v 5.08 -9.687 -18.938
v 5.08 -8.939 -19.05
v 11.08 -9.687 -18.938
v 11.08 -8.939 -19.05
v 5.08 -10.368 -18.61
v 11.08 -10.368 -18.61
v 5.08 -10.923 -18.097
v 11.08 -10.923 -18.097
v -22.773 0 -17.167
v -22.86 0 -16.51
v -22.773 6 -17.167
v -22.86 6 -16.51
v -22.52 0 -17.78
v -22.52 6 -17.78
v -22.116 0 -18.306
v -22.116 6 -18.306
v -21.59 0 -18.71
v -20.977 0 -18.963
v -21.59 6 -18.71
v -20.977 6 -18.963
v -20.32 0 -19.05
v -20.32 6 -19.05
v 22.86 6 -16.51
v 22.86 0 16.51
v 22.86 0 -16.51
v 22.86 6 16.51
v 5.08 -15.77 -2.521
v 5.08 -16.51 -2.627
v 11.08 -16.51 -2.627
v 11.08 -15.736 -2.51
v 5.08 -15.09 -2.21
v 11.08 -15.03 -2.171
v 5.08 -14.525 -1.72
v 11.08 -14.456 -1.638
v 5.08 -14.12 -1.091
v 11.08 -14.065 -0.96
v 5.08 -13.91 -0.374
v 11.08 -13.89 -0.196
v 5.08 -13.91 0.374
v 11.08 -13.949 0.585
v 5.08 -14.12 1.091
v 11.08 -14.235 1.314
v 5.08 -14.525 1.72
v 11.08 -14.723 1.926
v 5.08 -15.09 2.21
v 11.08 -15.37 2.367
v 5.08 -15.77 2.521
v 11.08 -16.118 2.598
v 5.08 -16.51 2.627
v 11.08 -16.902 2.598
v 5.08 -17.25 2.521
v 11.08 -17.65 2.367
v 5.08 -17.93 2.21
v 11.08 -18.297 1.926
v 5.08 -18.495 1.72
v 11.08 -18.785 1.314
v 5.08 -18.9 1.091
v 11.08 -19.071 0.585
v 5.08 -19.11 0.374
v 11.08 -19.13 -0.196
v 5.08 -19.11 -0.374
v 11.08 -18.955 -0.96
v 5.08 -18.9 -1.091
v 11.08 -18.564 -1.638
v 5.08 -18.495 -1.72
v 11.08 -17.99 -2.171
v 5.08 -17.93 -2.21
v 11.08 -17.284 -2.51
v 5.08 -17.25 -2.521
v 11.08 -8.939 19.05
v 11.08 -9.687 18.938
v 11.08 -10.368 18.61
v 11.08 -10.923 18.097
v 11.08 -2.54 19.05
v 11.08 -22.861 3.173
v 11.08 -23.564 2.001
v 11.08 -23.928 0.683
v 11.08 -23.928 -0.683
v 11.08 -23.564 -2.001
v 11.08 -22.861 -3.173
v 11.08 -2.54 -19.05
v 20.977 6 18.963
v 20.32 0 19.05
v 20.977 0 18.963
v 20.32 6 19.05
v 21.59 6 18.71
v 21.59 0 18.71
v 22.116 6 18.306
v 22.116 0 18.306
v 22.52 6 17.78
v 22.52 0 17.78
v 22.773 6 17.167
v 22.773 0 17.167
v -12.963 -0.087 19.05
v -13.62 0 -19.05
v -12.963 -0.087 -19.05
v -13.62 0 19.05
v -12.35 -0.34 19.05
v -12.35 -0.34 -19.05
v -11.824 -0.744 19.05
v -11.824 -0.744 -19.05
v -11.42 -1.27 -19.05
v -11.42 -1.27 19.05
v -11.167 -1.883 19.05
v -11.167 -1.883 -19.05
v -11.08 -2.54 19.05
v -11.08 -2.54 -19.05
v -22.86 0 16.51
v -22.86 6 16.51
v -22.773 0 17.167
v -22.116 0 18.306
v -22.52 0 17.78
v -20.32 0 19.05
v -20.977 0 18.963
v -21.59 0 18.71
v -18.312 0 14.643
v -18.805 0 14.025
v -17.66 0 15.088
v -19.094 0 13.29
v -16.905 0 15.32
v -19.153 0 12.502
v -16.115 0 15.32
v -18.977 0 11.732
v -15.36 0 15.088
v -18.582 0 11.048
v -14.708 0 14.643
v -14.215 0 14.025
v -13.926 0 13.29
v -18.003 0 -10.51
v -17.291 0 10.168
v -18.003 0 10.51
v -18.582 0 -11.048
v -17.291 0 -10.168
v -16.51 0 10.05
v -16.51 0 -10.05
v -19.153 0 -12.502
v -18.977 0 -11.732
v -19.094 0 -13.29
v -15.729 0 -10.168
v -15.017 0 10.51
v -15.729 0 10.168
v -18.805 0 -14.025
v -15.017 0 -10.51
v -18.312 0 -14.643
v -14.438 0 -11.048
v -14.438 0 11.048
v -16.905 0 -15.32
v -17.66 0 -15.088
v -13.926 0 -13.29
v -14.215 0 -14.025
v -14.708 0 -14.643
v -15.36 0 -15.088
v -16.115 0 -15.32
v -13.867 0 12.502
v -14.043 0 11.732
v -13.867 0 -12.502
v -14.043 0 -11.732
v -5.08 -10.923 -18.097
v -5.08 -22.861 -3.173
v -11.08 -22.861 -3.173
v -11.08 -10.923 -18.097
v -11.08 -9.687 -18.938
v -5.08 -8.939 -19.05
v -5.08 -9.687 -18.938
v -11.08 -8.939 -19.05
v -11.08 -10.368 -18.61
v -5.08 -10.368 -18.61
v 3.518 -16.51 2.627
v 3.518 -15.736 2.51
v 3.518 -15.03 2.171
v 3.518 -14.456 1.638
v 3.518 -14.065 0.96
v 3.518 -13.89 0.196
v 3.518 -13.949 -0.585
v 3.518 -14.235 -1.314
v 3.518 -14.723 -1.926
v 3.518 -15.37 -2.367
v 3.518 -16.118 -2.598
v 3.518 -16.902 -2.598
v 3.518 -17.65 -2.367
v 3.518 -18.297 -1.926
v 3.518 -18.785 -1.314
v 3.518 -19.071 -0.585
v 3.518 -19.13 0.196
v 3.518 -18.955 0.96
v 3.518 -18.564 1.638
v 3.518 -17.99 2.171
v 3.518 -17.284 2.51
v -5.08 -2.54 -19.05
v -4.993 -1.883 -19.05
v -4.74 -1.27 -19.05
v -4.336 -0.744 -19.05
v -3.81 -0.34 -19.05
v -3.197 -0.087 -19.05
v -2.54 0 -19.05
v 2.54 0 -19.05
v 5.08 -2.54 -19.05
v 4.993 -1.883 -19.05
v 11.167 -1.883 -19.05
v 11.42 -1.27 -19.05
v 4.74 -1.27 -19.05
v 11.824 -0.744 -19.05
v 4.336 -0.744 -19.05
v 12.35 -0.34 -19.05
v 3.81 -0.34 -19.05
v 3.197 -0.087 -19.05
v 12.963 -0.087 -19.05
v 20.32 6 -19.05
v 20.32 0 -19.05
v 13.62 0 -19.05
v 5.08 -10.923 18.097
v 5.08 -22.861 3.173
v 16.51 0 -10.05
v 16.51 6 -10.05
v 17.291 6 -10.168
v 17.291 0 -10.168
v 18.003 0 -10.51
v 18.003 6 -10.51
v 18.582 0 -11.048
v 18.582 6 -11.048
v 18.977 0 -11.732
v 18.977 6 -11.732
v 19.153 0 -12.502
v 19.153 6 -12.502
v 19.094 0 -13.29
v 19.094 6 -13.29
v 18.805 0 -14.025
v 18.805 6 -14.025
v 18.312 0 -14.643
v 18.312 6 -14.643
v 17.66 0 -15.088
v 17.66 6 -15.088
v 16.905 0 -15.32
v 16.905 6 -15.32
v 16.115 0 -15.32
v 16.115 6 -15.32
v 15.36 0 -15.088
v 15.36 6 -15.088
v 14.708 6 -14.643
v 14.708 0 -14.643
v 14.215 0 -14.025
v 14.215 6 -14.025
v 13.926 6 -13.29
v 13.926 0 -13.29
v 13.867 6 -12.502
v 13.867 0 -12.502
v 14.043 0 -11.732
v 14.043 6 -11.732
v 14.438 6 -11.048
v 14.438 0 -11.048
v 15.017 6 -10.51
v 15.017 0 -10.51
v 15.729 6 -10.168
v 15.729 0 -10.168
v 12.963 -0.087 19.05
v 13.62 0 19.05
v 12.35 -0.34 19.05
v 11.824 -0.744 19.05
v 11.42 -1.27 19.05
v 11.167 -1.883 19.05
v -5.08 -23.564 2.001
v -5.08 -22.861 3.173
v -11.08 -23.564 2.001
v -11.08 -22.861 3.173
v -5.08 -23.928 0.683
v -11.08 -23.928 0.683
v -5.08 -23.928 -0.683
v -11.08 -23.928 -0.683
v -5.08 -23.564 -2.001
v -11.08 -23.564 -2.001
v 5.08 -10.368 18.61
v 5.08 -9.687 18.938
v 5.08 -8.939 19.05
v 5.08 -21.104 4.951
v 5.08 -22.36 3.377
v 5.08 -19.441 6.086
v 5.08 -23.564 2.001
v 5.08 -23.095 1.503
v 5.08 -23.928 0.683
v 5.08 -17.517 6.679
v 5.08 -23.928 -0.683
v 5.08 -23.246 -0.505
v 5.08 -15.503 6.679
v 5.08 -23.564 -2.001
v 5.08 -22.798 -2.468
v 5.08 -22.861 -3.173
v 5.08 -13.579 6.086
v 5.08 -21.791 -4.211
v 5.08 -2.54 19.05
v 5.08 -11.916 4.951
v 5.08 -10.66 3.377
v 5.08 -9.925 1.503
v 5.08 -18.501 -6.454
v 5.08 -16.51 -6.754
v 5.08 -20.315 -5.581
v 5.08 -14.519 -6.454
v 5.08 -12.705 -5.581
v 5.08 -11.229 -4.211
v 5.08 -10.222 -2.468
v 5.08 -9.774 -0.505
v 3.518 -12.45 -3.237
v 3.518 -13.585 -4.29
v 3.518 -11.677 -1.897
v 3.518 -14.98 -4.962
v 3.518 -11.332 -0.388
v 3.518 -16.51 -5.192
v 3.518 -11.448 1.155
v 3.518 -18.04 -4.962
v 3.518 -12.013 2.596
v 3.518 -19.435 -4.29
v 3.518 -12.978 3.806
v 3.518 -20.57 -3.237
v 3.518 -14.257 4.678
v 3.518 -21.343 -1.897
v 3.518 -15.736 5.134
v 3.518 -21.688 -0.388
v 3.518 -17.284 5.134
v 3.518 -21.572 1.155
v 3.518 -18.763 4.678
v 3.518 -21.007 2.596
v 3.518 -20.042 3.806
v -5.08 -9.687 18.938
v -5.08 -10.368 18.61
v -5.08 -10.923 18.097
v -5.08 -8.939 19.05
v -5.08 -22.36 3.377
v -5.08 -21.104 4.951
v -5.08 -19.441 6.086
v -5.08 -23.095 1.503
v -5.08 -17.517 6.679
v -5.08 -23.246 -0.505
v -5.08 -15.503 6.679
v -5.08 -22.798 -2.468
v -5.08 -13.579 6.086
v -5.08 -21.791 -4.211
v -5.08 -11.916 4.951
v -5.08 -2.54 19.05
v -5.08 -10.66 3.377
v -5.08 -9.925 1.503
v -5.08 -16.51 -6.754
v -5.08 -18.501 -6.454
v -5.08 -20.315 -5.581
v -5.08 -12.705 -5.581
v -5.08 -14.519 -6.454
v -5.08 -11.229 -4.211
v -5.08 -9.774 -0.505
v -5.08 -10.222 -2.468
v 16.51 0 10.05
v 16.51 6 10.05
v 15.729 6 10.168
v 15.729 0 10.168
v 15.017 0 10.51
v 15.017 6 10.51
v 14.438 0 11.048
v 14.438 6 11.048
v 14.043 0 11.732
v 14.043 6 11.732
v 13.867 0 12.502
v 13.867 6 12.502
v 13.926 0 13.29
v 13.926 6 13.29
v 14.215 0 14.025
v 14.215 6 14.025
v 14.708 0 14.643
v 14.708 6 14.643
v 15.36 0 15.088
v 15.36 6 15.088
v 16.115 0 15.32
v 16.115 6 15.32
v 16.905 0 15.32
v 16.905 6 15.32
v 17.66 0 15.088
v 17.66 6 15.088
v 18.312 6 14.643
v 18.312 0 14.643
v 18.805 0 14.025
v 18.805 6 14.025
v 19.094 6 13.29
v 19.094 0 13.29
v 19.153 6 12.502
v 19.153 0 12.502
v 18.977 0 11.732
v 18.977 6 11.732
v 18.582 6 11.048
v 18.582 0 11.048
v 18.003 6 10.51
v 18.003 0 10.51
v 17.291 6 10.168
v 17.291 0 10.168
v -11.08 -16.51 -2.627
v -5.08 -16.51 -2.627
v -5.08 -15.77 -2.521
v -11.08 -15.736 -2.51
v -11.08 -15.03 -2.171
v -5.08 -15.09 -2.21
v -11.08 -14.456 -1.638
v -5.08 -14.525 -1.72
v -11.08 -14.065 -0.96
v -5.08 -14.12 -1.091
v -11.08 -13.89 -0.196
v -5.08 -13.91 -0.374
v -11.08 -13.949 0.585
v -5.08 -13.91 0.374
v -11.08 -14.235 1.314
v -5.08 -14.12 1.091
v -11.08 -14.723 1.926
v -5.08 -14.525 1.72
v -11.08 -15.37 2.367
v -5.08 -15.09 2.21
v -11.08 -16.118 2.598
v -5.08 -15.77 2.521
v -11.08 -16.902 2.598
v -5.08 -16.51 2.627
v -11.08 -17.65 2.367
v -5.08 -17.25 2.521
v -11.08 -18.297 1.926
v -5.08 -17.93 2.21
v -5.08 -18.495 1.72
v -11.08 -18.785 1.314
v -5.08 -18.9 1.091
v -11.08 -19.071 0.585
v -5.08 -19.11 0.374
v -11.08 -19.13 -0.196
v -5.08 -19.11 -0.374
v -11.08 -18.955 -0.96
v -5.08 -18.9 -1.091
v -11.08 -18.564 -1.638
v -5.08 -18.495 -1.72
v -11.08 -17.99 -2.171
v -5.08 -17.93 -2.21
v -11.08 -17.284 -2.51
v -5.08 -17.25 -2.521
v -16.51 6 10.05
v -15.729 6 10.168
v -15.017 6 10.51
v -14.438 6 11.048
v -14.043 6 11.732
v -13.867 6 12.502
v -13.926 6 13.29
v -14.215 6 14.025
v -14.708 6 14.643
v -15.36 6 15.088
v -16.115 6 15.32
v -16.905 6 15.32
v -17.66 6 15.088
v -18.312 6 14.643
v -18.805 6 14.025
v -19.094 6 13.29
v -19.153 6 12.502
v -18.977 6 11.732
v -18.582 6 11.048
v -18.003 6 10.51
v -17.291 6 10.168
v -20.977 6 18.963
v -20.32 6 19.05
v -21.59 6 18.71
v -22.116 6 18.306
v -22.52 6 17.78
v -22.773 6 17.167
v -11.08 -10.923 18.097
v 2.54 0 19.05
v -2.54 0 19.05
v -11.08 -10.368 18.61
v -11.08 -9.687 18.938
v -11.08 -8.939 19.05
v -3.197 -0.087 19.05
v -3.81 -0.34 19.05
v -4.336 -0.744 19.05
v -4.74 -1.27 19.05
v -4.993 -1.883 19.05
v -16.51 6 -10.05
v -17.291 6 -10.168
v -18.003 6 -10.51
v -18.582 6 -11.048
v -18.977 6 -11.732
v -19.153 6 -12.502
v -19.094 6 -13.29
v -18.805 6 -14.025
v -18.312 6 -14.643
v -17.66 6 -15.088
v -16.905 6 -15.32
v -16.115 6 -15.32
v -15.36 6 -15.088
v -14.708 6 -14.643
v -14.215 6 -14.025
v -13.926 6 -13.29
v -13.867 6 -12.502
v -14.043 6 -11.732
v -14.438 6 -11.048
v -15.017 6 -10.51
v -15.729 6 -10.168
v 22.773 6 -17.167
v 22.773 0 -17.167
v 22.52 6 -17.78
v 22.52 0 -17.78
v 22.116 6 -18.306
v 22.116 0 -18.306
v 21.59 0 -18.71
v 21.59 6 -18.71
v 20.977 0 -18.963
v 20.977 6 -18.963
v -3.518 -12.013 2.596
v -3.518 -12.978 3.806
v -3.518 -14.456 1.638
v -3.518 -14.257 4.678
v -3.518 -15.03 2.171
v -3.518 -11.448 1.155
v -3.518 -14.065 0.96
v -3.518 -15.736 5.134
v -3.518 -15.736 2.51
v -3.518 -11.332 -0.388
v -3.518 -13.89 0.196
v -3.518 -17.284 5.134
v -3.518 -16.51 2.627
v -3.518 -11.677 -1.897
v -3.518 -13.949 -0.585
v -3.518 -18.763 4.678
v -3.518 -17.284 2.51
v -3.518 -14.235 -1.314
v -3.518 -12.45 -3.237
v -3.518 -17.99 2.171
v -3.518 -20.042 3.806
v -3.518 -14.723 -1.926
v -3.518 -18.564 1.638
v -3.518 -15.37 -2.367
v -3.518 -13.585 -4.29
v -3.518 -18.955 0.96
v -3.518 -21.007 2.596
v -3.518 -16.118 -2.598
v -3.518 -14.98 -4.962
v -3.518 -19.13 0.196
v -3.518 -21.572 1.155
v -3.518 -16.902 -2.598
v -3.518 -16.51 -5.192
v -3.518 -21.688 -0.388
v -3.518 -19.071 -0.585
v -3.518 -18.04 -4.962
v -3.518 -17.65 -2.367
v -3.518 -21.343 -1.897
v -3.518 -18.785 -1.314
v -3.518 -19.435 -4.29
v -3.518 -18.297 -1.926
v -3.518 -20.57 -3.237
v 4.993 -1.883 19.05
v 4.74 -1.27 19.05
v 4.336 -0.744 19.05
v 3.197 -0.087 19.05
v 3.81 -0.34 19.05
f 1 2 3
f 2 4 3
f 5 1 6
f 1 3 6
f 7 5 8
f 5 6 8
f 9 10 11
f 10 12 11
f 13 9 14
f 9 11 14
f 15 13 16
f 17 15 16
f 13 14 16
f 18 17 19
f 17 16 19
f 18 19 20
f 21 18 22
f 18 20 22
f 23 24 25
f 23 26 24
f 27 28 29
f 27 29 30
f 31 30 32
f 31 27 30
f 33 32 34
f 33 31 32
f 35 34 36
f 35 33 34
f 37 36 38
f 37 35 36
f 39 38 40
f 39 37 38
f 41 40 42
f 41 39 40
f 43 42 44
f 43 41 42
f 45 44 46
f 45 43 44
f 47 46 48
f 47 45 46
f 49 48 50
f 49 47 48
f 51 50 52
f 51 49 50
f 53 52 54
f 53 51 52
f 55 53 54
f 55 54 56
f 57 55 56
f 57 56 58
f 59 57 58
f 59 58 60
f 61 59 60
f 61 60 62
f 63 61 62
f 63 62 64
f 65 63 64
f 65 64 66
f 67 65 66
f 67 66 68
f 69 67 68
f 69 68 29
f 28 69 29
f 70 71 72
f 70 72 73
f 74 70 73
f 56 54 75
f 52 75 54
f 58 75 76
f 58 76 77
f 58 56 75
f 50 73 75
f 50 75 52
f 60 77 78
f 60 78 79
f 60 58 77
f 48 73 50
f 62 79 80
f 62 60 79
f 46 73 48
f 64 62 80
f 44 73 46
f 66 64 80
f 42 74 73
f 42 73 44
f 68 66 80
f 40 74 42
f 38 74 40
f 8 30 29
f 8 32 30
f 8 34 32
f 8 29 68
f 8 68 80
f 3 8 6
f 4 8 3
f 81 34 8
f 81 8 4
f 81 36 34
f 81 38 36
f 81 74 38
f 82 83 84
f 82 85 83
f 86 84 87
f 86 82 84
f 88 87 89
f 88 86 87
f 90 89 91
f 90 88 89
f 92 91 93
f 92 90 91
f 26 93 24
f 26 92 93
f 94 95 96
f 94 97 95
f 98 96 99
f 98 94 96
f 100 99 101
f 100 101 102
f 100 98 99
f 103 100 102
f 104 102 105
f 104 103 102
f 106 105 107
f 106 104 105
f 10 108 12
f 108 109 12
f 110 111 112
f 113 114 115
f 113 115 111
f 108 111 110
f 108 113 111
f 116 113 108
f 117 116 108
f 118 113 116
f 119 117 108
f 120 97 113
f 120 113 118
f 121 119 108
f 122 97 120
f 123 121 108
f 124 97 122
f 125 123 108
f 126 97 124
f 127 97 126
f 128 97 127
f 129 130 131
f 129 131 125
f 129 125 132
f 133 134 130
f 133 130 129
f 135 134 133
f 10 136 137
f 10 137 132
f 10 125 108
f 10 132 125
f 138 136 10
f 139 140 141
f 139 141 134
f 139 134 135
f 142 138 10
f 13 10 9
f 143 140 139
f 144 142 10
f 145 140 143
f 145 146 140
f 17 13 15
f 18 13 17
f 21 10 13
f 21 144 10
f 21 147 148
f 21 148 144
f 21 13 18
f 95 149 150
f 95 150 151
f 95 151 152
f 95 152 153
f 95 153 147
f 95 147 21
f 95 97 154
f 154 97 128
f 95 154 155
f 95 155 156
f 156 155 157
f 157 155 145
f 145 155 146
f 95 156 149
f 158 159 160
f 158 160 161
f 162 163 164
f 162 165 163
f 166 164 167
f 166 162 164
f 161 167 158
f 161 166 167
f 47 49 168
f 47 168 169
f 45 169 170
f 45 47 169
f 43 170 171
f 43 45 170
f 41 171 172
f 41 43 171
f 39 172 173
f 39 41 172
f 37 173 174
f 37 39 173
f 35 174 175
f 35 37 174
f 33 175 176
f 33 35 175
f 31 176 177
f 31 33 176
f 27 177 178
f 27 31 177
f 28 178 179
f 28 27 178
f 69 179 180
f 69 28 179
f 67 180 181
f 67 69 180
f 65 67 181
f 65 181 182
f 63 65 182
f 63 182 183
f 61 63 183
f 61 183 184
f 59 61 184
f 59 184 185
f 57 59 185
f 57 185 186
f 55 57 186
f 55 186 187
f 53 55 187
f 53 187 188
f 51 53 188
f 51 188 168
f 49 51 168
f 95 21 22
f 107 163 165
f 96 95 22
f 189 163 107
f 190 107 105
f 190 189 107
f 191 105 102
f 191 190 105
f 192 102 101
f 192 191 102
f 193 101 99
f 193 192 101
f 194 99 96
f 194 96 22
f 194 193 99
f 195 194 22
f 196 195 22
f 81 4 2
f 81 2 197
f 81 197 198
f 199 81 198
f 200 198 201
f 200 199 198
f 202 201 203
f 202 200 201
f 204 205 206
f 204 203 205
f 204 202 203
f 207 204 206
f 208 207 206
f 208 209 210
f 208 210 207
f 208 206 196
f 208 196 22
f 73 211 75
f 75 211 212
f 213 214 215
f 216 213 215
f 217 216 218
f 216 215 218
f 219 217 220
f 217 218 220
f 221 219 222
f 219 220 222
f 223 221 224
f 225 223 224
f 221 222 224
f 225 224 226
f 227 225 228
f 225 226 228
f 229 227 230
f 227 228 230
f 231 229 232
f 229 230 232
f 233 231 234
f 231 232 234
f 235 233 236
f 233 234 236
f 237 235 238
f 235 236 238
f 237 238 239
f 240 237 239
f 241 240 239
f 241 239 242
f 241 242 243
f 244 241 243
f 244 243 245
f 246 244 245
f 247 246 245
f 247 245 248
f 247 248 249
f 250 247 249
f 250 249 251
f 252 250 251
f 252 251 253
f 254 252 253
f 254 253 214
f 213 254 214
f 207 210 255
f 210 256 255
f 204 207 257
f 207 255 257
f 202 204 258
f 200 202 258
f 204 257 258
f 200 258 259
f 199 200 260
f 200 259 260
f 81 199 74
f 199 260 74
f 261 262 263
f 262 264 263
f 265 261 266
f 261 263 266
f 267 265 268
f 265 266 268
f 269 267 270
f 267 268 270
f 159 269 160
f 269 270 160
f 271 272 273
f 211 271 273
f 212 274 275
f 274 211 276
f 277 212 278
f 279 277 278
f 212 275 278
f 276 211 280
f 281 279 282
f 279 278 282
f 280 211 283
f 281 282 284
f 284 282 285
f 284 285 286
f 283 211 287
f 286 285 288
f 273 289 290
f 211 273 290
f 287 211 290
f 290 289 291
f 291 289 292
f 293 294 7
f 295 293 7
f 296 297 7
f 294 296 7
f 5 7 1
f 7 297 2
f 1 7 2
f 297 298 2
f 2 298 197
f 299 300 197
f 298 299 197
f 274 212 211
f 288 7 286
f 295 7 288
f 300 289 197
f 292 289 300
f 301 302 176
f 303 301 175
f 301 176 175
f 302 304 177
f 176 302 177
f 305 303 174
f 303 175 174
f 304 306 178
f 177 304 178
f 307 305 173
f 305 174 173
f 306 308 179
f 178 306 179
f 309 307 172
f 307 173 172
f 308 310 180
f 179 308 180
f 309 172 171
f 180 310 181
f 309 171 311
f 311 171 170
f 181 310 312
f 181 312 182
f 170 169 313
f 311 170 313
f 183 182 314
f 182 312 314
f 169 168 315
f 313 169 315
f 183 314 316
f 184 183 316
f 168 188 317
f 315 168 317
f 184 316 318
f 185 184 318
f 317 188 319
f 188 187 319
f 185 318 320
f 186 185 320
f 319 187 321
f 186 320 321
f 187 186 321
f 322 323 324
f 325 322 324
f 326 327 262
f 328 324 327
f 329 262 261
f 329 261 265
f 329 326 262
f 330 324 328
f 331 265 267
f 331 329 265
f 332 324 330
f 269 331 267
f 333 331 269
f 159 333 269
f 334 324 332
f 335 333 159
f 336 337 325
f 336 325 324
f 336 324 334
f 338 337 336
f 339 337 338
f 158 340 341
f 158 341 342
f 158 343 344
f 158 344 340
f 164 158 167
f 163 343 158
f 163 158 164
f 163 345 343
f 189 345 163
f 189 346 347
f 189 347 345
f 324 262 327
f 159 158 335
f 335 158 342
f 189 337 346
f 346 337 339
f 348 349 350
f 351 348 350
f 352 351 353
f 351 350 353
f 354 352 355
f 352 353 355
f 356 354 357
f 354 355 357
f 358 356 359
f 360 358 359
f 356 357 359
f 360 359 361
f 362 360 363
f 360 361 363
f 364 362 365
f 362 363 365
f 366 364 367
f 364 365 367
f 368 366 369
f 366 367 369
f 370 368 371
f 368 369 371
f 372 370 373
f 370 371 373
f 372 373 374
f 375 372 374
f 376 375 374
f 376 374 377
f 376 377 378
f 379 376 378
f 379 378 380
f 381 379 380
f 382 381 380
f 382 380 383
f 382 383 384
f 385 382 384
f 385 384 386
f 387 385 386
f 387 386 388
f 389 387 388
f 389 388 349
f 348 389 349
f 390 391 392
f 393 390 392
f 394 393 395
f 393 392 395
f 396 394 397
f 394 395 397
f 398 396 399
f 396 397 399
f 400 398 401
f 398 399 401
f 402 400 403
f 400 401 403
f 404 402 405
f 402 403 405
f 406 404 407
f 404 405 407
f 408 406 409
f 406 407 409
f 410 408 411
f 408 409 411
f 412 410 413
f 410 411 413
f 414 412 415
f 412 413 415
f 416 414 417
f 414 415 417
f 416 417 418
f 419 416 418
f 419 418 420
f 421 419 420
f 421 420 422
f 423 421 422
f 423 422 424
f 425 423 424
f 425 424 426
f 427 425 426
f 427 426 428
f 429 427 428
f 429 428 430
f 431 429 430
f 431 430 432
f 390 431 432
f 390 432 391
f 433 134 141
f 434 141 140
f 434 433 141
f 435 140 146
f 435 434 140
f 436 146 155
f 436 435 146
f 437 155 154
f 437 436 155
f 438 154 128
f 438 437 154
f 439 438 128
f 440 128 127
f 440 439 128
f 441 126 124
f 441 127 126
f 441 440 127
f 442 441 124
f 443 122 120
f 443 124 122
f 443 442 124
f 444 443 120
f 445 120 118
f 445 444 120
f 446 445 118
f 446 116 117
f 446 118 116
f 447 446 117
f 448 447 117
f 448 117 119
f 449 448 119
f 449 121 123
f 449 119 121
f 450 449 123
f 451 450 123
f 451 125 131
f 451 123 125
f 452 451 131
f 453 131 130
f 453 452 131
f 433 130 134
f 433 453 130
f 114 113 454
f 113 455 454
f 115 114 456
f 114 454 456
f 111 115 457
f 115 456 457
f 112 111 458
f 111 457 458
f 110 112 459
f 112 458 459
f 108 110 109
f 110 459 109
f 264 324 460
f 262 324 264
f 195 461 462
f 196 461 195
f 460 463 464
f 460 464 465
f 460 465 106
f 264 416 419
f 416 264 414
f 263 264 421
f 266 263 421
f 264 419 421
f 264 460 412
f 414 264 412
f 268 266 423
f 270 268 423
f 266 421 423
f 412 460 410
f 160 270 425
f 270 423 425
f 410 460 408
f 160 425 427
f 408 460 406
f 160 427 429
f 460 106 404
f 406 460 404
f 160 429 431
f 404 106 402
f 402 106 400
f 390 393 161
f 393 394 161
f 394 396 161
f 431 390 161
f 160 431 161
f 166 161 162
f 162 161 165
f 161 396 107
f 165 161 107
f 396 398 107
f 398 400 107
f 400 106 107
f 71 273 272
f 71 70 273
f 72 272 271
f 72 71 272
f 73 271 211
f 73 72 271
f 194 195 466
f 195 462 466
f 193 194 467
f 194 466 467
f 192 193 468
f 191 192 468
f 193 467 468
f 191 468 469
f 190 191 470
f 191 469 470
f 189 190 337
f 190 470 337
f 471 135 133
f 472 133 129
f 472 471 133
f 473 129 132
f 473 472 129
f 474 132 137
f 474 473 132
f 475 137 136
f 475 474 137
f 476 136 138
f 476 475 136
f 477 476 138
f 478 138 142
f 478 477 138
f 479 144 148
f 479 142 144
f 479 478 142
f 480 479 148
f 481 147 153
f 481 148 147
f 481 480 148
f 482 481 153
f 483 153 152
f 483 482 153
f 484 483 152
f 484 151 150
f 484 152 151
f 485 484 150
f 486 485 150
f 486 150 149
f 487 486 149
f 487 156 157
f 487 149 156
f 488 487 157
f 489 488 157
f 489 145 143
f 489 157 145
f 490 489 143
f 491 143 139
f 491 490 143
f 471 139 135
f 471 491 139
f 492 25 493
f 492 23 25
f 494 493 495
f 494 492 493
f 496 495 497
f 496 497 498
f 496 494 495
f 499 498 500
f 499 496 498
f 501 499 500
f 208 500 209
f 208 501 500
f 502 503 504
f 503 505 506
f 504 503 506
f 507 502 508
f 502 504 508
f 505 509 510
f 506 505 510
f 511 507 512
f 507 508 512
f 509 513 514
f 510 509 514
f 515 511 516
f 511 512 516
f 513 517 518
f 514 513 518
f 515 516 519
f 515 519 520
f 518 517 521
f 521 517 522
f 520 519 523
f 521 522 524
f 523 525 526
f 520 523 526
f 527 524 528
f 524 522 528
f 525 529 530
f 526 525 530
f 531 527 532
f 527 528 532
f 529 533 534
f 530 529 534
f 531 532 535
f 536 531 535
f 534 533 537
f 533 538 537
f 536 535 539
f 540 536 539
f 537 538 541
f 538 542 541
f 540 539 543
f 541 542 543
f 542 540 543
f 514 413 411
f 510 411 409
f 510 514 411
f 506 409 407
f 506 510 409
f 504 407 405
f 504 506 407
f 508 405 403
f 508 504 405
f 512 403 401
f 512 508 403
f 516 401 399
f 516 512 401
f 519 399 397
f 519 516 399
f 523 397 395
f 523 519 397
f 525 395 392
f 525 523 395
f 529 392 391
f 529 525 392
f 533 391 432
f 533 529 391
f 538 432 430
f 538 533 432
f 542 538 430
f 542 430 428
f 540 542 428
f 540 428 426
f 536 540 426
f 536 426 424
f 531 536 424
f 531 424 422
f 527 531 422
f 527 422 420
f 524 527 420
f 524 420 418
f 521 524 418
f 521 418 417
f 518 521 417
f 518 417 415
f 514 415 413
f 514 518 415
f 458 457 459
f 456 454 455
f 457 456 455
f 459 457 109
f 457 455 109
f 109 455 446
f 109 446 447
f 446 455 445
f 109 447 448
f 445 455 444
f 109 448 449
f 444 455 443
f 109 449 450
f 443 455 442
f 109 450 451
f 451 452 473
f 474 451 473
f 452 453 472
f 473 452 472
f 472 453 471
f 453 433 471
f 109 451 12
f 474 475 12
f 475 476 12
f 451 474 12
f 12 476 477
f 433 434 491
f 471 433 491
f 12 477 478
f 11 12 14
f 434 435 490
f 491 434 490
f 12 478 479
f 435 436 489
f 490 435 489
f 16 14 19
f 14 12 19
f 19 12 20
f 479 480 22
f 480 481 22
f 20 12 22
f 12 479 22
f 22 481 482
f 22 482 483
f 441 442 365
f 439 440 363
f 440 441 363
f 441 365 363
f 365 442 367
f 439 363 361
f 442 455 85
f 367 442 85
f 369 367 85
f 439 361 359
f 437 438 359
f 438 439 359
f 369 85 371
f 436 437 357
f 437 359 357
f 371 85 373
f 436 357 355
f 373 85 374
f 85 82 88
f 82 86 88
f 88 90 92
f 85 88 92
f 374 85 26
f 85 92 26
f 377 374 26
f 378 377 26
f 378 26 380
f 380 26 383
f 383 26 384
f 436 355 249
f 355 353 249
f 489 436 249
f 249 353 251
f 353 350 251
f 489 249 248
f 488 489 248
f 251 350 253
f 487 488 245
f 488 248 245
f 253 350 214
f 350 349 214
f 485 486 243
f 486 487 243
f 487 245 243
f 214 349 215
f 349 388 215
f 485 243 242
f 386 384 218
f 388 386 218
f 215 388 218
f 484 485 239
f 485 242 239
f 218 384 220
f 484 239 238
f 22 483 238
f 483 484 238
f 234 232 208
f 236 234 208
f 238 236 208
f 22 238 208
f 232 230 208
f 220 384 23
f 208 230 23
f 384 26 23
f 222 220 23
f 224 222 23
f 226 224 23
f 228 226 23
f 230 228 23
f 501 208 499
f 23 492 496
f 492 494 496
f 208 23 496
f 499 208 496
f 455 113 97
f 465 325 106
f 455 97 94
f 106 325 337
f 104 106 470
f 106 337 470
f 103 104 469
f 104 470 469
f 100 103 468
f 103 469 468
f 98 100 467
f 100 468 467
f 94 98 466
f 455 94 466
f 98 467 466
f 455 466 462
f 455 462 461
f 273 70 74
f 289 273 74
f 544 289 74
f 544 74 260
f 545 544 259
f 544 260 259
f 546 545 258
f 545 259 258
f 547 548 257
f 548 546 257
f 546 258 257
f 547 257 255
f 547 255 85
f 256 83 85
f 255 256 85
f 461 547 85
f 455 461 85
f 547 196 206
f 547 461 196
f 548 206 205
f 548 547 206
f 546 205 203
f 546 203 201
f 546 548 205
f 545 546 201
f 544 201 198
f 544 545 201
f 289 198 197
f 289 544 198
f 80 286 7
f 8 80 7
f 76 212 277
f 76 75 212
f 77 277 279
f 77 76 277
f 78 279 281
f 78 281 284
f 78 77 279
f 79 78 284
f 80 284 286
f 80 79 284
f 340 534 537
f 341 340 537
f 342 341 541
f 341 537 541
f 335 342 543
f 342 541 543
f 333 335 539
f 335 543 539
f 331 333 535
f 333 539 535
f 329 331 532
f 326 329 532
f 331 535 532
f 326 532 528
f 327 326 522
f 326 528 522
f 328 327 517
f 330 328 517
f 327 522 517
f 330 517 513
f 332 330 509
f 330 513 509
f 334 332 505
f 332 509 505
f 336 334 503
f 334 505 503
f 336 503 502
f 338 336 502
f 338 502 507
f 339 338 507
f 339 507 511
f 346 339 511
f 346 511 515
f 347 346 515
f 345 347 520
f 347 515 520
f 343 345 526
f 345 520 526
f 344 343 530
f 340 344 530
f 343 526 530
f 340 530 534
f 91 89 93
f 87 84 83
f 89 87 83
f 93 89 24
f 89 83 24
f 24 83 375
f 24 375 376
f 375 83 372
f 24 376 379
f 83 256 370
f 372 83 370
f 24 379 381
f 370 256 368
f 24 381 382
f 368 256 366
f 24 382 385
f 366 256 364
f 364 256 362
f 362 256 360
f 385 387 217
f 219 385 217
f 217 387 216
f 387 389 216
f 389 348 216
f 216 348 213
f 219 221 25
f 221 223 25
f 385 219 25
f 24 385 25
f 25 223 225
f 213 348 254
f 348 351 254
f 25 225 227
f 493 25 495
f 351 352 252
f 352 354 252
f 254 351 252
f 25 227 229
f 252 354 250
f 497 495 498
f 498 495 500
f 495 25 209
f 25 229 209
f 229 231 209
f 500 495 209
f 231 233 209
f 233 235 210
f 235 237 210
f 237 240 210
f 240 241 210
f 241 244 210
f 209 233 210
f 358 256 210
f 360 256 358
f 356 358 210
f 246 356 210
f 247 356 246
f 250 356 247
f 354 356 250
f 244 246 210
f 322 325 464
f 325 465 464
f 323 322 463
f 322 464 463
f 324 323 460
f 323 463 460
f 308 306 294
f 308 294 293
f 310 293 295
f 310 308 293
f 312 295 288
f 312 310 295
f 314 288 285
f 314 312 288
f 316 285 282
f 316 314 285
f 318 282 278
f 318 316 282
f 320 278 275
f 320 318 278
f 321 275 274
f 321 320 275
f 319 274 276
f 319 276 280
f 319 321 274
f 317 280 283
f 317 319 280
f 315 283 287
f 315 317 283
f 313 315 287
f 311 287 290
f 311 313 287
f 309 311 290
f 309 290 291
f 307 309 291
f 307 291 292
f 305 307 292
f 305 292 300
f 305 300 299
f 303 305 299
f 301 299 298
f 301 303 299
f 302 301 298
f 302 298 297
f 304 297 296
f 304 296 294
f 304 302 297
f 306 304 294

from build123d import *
from OCP.BRepFilletAPI import BRepFilletAPI_MakeFillet

# Parameters (mm, degrees)
SKETCH1_R           = 2.627
BOSS_EXTRUDE1_DEPTH = 6
BOSS_EXTRUDE2_START = -5.08
SKETCH1_3_W         = 38.1
SKETCH1_3_H         = 5.999999938
BOSS_EXTRUDE2_DEPTH = 22.86
SKETCH3_R           = 2.65
CUT_EXTRUDE1_DEPTH  = 44.260167546
FILLET1_R1          = 2.54
FILLET1_R2          = 5.08
SKETCH4_R           = 4.2145
SKETCH4_R_2         = 2.627
BOSS_EXTRUDE3_DEPTH = 1.5621
BOSS_EXTRUDE4_START = 8.5979
SKETCH4_2_R         = 4.2145
SKETCH4_2_R_2       = 2.627
BOSS_EXTRUDE4_DEPTH = 1.5621
CHAMFER2_SIZE       = 2.54


with BuildPart() as part:
    # Sketch1 → Boss-Extrude1 (new body)
    with BuildSketch(Plane(origin=(5.08, 0, 0), x_dir=(0, 0, -1), z_dir=(1, 0, 0))):
        Polygon((-19.05, 0), (-19.05, -10.16), (0, -25.4), (19.05, -10.16), (19.05, 0), align=None)
        with Locations((0, -16.51)):
            Circle(SKETCH1_R, mode=Mode.SUBTRACT)
    boss_extrude1 = extrude(amount=BOSS_EXTRUDE1_DEPTH)

    # Sketch1<3> → Boss-Extrude2 (add)
    with BuildSketch(Plane(origin=(5.08, 0, 0), x_dir=(0, 0, -1), z_dir=(1, 0, 0)).offset(BOSS_EXTRUDE2_START)):
        with Locations((0, 2.999999969)):
            Rectangle(SKETCH1_3_W, SKETCH1_3_H)
    boss_extrude2 = extrude(amount=BOSS_EXTRUDE2_DEPTH)

    # Sketch3 → Cut-Extrude1 (cut, through all)
    with BuildSketch(Plane(origin=(0, 5.999999938, 0), x_dir=(1, 0, 0), z_dir=(0, 1, 0))):
        with Locations(Location((16.51, 12.7, 0), (0, 0, 270))):
            Circle(SKETCH3_R)
        with Locations(Location((16.51, -12.7, 0), (0, 0, 90))):
            Circle(SKETCH3_R)
    cut_extrude1 = extrude(amount=-CUT_EXTRUDE1_DEPTH, mode=Mode.SUBTRACT)

    # Mirror2: Boss-Extrude2, Cut-Extrude1 across plane
    add(boss_extrude2.mirror(Plane(origin=(0, 0, 0), x_dir=(0, 0, 1), z_dir=(1, 0, 0))))
    add(cut_extrude1.mirror(Plane(origin=(0, 0, 0), x_dir=(0, 0, 1), z_dir=(1, 0, 0))), mode=Mode.SUBTRACT)

    # Mirror3: Boss-Extrude1 across plane
    add(boss_extrude1.mirror(Plane(origin=(0, 0, 0), x_dir=(0, 0, 1), z_dir=(1, 0, 0))))

    # Fillet1: one fillet with a radius per group of edges: ONE call of the kernel's fillet builder (fillet() takes one radius for all edges)
    fillet1_edges_1 = [part.edges().sort_by_distance(p)[0] for p in [
        (8.08, -10.16, 19.05),
        (8.08, -10.16, -19.05),
        (11.08, 0, 0),
        (22.86, 2.999999969, 19.05),
        (22.86, 2.999999969, -19.05),
        (-22.86, 2.999999969, -19.05),
        (-22.86, 2.999999969, 19.05),
        (-8.08, -10.16, -19.05),
        (-8.08, -10.16, 19.05),
        (-5.08, 0, 0),
        (-11.08, 0, 0),
        (5.08, 0, 0),
    ]]
    fillet1_edges_2 = [part.edges().sort_by_distance(p)[0] for p in [
        (8.08, -25.4, 0),
        (-8.08, -25.4, 0),
    ]]
    fillet1 = BRepFilletAPI_MakeFillet(part.part.solid().wrapped)
    for e in fillet1_edges_1:
        fillet1.Add(FILLET1_R1, e.wrapped)
    for e in fillet1_edges_2:
        fillet1.Add(FILLET1_R2, e.wrapped)
    add(Compound.cast(fillet1.Shape()), mode=Mode.REPLACE)

    # Sketch4 → Boss-Extrude3 (add)
    with BuildSketch(Plane.ZY.offset(-5.08)):
        with Locations(Location((0, -16.51, 0), (0, 0, 180))):
            Circle(SKETCH4_R)
        with Locations((0, -16.51)):
            Circle(SKETCH4_R_2, mode=Mode.SUBTRACT)
    extrude(amount=BOSS_EXTRUDE3_DEPTH)

    # Sketch4<2> → Boss-Extrude4 (add)
    with BuildSketch(Plane.ZY.offset(-5.08).offset(BOSS_EXTRUDE4_START)):
        with Locations(Location((0, -16.51, 0), (0, 0, 180))):
            Circle(SKETCH4_2_R)
        with Locations((0, -16.51)):
            Circle(SKETCH4_2_R_2, mode=Mode.SUBTRACT)
    extrude(amount=BOSS_EXTRUDE4_DEPTH)

    # Chamfer2
    # the kernel refuses this chamfer: 2.54 mm, written as the material it adds along each edge
    with BuildSketch(Plane(origin=(5.08, -16.51, 0), x_dir=(0, 0, -1), z_dir=(0, 1, 0))) as chamfer2_piece_1_section:
        Polygon((4.2145 + CHAMFER2_SIZE, 0), (4.2145, CHAMFER2_SIZE), (4.2145, 0), align=None)
    chamfer2_piece_1 = revolve(axis=Axis((5.08, -16.51, 0), (-1, 0, 0)), mode=Mode.PRIVATE)
    chamfer2_piece_1 = split(chamfer2_piece_1, bisect_by=Plane(origin=(3.5179, -16.51, 5.976913078), z_dir=(1, 0, 0)), keep=Keep.TOP, mode=Mode.PRIVATE)
    add(chamfer2_piece_1)
    with BuildSketch(Plane(origin=(-5.08, -16.51, 0), x_dir=(0, 0, -1), z_dir=(0, 1, 0))) as chamfer2_piece_2_section:
        Polygon((4.2145 + CHAMFER2_SIZE, 0), (4.2145, -CHAMFER2_SIZE), (4.2145, 0), align=None)
    chamfer2_piece_2 = revolve(axis=Axis((-5.08, -16.51, 0), (-1, 0, 0)), mode=Mode.PRIVATE)
    chamfer2_piece_2 = split(chamfer2_piece_2, bisect_by=Plane(origin=(-3.5179, -16.51, 5.976913078), z_dir=(-1, 0, 0)), keep=Keep.TOP, mode=Mode.PRIVATE)
    add(chamfer2_piece_2)


solid = part.part
